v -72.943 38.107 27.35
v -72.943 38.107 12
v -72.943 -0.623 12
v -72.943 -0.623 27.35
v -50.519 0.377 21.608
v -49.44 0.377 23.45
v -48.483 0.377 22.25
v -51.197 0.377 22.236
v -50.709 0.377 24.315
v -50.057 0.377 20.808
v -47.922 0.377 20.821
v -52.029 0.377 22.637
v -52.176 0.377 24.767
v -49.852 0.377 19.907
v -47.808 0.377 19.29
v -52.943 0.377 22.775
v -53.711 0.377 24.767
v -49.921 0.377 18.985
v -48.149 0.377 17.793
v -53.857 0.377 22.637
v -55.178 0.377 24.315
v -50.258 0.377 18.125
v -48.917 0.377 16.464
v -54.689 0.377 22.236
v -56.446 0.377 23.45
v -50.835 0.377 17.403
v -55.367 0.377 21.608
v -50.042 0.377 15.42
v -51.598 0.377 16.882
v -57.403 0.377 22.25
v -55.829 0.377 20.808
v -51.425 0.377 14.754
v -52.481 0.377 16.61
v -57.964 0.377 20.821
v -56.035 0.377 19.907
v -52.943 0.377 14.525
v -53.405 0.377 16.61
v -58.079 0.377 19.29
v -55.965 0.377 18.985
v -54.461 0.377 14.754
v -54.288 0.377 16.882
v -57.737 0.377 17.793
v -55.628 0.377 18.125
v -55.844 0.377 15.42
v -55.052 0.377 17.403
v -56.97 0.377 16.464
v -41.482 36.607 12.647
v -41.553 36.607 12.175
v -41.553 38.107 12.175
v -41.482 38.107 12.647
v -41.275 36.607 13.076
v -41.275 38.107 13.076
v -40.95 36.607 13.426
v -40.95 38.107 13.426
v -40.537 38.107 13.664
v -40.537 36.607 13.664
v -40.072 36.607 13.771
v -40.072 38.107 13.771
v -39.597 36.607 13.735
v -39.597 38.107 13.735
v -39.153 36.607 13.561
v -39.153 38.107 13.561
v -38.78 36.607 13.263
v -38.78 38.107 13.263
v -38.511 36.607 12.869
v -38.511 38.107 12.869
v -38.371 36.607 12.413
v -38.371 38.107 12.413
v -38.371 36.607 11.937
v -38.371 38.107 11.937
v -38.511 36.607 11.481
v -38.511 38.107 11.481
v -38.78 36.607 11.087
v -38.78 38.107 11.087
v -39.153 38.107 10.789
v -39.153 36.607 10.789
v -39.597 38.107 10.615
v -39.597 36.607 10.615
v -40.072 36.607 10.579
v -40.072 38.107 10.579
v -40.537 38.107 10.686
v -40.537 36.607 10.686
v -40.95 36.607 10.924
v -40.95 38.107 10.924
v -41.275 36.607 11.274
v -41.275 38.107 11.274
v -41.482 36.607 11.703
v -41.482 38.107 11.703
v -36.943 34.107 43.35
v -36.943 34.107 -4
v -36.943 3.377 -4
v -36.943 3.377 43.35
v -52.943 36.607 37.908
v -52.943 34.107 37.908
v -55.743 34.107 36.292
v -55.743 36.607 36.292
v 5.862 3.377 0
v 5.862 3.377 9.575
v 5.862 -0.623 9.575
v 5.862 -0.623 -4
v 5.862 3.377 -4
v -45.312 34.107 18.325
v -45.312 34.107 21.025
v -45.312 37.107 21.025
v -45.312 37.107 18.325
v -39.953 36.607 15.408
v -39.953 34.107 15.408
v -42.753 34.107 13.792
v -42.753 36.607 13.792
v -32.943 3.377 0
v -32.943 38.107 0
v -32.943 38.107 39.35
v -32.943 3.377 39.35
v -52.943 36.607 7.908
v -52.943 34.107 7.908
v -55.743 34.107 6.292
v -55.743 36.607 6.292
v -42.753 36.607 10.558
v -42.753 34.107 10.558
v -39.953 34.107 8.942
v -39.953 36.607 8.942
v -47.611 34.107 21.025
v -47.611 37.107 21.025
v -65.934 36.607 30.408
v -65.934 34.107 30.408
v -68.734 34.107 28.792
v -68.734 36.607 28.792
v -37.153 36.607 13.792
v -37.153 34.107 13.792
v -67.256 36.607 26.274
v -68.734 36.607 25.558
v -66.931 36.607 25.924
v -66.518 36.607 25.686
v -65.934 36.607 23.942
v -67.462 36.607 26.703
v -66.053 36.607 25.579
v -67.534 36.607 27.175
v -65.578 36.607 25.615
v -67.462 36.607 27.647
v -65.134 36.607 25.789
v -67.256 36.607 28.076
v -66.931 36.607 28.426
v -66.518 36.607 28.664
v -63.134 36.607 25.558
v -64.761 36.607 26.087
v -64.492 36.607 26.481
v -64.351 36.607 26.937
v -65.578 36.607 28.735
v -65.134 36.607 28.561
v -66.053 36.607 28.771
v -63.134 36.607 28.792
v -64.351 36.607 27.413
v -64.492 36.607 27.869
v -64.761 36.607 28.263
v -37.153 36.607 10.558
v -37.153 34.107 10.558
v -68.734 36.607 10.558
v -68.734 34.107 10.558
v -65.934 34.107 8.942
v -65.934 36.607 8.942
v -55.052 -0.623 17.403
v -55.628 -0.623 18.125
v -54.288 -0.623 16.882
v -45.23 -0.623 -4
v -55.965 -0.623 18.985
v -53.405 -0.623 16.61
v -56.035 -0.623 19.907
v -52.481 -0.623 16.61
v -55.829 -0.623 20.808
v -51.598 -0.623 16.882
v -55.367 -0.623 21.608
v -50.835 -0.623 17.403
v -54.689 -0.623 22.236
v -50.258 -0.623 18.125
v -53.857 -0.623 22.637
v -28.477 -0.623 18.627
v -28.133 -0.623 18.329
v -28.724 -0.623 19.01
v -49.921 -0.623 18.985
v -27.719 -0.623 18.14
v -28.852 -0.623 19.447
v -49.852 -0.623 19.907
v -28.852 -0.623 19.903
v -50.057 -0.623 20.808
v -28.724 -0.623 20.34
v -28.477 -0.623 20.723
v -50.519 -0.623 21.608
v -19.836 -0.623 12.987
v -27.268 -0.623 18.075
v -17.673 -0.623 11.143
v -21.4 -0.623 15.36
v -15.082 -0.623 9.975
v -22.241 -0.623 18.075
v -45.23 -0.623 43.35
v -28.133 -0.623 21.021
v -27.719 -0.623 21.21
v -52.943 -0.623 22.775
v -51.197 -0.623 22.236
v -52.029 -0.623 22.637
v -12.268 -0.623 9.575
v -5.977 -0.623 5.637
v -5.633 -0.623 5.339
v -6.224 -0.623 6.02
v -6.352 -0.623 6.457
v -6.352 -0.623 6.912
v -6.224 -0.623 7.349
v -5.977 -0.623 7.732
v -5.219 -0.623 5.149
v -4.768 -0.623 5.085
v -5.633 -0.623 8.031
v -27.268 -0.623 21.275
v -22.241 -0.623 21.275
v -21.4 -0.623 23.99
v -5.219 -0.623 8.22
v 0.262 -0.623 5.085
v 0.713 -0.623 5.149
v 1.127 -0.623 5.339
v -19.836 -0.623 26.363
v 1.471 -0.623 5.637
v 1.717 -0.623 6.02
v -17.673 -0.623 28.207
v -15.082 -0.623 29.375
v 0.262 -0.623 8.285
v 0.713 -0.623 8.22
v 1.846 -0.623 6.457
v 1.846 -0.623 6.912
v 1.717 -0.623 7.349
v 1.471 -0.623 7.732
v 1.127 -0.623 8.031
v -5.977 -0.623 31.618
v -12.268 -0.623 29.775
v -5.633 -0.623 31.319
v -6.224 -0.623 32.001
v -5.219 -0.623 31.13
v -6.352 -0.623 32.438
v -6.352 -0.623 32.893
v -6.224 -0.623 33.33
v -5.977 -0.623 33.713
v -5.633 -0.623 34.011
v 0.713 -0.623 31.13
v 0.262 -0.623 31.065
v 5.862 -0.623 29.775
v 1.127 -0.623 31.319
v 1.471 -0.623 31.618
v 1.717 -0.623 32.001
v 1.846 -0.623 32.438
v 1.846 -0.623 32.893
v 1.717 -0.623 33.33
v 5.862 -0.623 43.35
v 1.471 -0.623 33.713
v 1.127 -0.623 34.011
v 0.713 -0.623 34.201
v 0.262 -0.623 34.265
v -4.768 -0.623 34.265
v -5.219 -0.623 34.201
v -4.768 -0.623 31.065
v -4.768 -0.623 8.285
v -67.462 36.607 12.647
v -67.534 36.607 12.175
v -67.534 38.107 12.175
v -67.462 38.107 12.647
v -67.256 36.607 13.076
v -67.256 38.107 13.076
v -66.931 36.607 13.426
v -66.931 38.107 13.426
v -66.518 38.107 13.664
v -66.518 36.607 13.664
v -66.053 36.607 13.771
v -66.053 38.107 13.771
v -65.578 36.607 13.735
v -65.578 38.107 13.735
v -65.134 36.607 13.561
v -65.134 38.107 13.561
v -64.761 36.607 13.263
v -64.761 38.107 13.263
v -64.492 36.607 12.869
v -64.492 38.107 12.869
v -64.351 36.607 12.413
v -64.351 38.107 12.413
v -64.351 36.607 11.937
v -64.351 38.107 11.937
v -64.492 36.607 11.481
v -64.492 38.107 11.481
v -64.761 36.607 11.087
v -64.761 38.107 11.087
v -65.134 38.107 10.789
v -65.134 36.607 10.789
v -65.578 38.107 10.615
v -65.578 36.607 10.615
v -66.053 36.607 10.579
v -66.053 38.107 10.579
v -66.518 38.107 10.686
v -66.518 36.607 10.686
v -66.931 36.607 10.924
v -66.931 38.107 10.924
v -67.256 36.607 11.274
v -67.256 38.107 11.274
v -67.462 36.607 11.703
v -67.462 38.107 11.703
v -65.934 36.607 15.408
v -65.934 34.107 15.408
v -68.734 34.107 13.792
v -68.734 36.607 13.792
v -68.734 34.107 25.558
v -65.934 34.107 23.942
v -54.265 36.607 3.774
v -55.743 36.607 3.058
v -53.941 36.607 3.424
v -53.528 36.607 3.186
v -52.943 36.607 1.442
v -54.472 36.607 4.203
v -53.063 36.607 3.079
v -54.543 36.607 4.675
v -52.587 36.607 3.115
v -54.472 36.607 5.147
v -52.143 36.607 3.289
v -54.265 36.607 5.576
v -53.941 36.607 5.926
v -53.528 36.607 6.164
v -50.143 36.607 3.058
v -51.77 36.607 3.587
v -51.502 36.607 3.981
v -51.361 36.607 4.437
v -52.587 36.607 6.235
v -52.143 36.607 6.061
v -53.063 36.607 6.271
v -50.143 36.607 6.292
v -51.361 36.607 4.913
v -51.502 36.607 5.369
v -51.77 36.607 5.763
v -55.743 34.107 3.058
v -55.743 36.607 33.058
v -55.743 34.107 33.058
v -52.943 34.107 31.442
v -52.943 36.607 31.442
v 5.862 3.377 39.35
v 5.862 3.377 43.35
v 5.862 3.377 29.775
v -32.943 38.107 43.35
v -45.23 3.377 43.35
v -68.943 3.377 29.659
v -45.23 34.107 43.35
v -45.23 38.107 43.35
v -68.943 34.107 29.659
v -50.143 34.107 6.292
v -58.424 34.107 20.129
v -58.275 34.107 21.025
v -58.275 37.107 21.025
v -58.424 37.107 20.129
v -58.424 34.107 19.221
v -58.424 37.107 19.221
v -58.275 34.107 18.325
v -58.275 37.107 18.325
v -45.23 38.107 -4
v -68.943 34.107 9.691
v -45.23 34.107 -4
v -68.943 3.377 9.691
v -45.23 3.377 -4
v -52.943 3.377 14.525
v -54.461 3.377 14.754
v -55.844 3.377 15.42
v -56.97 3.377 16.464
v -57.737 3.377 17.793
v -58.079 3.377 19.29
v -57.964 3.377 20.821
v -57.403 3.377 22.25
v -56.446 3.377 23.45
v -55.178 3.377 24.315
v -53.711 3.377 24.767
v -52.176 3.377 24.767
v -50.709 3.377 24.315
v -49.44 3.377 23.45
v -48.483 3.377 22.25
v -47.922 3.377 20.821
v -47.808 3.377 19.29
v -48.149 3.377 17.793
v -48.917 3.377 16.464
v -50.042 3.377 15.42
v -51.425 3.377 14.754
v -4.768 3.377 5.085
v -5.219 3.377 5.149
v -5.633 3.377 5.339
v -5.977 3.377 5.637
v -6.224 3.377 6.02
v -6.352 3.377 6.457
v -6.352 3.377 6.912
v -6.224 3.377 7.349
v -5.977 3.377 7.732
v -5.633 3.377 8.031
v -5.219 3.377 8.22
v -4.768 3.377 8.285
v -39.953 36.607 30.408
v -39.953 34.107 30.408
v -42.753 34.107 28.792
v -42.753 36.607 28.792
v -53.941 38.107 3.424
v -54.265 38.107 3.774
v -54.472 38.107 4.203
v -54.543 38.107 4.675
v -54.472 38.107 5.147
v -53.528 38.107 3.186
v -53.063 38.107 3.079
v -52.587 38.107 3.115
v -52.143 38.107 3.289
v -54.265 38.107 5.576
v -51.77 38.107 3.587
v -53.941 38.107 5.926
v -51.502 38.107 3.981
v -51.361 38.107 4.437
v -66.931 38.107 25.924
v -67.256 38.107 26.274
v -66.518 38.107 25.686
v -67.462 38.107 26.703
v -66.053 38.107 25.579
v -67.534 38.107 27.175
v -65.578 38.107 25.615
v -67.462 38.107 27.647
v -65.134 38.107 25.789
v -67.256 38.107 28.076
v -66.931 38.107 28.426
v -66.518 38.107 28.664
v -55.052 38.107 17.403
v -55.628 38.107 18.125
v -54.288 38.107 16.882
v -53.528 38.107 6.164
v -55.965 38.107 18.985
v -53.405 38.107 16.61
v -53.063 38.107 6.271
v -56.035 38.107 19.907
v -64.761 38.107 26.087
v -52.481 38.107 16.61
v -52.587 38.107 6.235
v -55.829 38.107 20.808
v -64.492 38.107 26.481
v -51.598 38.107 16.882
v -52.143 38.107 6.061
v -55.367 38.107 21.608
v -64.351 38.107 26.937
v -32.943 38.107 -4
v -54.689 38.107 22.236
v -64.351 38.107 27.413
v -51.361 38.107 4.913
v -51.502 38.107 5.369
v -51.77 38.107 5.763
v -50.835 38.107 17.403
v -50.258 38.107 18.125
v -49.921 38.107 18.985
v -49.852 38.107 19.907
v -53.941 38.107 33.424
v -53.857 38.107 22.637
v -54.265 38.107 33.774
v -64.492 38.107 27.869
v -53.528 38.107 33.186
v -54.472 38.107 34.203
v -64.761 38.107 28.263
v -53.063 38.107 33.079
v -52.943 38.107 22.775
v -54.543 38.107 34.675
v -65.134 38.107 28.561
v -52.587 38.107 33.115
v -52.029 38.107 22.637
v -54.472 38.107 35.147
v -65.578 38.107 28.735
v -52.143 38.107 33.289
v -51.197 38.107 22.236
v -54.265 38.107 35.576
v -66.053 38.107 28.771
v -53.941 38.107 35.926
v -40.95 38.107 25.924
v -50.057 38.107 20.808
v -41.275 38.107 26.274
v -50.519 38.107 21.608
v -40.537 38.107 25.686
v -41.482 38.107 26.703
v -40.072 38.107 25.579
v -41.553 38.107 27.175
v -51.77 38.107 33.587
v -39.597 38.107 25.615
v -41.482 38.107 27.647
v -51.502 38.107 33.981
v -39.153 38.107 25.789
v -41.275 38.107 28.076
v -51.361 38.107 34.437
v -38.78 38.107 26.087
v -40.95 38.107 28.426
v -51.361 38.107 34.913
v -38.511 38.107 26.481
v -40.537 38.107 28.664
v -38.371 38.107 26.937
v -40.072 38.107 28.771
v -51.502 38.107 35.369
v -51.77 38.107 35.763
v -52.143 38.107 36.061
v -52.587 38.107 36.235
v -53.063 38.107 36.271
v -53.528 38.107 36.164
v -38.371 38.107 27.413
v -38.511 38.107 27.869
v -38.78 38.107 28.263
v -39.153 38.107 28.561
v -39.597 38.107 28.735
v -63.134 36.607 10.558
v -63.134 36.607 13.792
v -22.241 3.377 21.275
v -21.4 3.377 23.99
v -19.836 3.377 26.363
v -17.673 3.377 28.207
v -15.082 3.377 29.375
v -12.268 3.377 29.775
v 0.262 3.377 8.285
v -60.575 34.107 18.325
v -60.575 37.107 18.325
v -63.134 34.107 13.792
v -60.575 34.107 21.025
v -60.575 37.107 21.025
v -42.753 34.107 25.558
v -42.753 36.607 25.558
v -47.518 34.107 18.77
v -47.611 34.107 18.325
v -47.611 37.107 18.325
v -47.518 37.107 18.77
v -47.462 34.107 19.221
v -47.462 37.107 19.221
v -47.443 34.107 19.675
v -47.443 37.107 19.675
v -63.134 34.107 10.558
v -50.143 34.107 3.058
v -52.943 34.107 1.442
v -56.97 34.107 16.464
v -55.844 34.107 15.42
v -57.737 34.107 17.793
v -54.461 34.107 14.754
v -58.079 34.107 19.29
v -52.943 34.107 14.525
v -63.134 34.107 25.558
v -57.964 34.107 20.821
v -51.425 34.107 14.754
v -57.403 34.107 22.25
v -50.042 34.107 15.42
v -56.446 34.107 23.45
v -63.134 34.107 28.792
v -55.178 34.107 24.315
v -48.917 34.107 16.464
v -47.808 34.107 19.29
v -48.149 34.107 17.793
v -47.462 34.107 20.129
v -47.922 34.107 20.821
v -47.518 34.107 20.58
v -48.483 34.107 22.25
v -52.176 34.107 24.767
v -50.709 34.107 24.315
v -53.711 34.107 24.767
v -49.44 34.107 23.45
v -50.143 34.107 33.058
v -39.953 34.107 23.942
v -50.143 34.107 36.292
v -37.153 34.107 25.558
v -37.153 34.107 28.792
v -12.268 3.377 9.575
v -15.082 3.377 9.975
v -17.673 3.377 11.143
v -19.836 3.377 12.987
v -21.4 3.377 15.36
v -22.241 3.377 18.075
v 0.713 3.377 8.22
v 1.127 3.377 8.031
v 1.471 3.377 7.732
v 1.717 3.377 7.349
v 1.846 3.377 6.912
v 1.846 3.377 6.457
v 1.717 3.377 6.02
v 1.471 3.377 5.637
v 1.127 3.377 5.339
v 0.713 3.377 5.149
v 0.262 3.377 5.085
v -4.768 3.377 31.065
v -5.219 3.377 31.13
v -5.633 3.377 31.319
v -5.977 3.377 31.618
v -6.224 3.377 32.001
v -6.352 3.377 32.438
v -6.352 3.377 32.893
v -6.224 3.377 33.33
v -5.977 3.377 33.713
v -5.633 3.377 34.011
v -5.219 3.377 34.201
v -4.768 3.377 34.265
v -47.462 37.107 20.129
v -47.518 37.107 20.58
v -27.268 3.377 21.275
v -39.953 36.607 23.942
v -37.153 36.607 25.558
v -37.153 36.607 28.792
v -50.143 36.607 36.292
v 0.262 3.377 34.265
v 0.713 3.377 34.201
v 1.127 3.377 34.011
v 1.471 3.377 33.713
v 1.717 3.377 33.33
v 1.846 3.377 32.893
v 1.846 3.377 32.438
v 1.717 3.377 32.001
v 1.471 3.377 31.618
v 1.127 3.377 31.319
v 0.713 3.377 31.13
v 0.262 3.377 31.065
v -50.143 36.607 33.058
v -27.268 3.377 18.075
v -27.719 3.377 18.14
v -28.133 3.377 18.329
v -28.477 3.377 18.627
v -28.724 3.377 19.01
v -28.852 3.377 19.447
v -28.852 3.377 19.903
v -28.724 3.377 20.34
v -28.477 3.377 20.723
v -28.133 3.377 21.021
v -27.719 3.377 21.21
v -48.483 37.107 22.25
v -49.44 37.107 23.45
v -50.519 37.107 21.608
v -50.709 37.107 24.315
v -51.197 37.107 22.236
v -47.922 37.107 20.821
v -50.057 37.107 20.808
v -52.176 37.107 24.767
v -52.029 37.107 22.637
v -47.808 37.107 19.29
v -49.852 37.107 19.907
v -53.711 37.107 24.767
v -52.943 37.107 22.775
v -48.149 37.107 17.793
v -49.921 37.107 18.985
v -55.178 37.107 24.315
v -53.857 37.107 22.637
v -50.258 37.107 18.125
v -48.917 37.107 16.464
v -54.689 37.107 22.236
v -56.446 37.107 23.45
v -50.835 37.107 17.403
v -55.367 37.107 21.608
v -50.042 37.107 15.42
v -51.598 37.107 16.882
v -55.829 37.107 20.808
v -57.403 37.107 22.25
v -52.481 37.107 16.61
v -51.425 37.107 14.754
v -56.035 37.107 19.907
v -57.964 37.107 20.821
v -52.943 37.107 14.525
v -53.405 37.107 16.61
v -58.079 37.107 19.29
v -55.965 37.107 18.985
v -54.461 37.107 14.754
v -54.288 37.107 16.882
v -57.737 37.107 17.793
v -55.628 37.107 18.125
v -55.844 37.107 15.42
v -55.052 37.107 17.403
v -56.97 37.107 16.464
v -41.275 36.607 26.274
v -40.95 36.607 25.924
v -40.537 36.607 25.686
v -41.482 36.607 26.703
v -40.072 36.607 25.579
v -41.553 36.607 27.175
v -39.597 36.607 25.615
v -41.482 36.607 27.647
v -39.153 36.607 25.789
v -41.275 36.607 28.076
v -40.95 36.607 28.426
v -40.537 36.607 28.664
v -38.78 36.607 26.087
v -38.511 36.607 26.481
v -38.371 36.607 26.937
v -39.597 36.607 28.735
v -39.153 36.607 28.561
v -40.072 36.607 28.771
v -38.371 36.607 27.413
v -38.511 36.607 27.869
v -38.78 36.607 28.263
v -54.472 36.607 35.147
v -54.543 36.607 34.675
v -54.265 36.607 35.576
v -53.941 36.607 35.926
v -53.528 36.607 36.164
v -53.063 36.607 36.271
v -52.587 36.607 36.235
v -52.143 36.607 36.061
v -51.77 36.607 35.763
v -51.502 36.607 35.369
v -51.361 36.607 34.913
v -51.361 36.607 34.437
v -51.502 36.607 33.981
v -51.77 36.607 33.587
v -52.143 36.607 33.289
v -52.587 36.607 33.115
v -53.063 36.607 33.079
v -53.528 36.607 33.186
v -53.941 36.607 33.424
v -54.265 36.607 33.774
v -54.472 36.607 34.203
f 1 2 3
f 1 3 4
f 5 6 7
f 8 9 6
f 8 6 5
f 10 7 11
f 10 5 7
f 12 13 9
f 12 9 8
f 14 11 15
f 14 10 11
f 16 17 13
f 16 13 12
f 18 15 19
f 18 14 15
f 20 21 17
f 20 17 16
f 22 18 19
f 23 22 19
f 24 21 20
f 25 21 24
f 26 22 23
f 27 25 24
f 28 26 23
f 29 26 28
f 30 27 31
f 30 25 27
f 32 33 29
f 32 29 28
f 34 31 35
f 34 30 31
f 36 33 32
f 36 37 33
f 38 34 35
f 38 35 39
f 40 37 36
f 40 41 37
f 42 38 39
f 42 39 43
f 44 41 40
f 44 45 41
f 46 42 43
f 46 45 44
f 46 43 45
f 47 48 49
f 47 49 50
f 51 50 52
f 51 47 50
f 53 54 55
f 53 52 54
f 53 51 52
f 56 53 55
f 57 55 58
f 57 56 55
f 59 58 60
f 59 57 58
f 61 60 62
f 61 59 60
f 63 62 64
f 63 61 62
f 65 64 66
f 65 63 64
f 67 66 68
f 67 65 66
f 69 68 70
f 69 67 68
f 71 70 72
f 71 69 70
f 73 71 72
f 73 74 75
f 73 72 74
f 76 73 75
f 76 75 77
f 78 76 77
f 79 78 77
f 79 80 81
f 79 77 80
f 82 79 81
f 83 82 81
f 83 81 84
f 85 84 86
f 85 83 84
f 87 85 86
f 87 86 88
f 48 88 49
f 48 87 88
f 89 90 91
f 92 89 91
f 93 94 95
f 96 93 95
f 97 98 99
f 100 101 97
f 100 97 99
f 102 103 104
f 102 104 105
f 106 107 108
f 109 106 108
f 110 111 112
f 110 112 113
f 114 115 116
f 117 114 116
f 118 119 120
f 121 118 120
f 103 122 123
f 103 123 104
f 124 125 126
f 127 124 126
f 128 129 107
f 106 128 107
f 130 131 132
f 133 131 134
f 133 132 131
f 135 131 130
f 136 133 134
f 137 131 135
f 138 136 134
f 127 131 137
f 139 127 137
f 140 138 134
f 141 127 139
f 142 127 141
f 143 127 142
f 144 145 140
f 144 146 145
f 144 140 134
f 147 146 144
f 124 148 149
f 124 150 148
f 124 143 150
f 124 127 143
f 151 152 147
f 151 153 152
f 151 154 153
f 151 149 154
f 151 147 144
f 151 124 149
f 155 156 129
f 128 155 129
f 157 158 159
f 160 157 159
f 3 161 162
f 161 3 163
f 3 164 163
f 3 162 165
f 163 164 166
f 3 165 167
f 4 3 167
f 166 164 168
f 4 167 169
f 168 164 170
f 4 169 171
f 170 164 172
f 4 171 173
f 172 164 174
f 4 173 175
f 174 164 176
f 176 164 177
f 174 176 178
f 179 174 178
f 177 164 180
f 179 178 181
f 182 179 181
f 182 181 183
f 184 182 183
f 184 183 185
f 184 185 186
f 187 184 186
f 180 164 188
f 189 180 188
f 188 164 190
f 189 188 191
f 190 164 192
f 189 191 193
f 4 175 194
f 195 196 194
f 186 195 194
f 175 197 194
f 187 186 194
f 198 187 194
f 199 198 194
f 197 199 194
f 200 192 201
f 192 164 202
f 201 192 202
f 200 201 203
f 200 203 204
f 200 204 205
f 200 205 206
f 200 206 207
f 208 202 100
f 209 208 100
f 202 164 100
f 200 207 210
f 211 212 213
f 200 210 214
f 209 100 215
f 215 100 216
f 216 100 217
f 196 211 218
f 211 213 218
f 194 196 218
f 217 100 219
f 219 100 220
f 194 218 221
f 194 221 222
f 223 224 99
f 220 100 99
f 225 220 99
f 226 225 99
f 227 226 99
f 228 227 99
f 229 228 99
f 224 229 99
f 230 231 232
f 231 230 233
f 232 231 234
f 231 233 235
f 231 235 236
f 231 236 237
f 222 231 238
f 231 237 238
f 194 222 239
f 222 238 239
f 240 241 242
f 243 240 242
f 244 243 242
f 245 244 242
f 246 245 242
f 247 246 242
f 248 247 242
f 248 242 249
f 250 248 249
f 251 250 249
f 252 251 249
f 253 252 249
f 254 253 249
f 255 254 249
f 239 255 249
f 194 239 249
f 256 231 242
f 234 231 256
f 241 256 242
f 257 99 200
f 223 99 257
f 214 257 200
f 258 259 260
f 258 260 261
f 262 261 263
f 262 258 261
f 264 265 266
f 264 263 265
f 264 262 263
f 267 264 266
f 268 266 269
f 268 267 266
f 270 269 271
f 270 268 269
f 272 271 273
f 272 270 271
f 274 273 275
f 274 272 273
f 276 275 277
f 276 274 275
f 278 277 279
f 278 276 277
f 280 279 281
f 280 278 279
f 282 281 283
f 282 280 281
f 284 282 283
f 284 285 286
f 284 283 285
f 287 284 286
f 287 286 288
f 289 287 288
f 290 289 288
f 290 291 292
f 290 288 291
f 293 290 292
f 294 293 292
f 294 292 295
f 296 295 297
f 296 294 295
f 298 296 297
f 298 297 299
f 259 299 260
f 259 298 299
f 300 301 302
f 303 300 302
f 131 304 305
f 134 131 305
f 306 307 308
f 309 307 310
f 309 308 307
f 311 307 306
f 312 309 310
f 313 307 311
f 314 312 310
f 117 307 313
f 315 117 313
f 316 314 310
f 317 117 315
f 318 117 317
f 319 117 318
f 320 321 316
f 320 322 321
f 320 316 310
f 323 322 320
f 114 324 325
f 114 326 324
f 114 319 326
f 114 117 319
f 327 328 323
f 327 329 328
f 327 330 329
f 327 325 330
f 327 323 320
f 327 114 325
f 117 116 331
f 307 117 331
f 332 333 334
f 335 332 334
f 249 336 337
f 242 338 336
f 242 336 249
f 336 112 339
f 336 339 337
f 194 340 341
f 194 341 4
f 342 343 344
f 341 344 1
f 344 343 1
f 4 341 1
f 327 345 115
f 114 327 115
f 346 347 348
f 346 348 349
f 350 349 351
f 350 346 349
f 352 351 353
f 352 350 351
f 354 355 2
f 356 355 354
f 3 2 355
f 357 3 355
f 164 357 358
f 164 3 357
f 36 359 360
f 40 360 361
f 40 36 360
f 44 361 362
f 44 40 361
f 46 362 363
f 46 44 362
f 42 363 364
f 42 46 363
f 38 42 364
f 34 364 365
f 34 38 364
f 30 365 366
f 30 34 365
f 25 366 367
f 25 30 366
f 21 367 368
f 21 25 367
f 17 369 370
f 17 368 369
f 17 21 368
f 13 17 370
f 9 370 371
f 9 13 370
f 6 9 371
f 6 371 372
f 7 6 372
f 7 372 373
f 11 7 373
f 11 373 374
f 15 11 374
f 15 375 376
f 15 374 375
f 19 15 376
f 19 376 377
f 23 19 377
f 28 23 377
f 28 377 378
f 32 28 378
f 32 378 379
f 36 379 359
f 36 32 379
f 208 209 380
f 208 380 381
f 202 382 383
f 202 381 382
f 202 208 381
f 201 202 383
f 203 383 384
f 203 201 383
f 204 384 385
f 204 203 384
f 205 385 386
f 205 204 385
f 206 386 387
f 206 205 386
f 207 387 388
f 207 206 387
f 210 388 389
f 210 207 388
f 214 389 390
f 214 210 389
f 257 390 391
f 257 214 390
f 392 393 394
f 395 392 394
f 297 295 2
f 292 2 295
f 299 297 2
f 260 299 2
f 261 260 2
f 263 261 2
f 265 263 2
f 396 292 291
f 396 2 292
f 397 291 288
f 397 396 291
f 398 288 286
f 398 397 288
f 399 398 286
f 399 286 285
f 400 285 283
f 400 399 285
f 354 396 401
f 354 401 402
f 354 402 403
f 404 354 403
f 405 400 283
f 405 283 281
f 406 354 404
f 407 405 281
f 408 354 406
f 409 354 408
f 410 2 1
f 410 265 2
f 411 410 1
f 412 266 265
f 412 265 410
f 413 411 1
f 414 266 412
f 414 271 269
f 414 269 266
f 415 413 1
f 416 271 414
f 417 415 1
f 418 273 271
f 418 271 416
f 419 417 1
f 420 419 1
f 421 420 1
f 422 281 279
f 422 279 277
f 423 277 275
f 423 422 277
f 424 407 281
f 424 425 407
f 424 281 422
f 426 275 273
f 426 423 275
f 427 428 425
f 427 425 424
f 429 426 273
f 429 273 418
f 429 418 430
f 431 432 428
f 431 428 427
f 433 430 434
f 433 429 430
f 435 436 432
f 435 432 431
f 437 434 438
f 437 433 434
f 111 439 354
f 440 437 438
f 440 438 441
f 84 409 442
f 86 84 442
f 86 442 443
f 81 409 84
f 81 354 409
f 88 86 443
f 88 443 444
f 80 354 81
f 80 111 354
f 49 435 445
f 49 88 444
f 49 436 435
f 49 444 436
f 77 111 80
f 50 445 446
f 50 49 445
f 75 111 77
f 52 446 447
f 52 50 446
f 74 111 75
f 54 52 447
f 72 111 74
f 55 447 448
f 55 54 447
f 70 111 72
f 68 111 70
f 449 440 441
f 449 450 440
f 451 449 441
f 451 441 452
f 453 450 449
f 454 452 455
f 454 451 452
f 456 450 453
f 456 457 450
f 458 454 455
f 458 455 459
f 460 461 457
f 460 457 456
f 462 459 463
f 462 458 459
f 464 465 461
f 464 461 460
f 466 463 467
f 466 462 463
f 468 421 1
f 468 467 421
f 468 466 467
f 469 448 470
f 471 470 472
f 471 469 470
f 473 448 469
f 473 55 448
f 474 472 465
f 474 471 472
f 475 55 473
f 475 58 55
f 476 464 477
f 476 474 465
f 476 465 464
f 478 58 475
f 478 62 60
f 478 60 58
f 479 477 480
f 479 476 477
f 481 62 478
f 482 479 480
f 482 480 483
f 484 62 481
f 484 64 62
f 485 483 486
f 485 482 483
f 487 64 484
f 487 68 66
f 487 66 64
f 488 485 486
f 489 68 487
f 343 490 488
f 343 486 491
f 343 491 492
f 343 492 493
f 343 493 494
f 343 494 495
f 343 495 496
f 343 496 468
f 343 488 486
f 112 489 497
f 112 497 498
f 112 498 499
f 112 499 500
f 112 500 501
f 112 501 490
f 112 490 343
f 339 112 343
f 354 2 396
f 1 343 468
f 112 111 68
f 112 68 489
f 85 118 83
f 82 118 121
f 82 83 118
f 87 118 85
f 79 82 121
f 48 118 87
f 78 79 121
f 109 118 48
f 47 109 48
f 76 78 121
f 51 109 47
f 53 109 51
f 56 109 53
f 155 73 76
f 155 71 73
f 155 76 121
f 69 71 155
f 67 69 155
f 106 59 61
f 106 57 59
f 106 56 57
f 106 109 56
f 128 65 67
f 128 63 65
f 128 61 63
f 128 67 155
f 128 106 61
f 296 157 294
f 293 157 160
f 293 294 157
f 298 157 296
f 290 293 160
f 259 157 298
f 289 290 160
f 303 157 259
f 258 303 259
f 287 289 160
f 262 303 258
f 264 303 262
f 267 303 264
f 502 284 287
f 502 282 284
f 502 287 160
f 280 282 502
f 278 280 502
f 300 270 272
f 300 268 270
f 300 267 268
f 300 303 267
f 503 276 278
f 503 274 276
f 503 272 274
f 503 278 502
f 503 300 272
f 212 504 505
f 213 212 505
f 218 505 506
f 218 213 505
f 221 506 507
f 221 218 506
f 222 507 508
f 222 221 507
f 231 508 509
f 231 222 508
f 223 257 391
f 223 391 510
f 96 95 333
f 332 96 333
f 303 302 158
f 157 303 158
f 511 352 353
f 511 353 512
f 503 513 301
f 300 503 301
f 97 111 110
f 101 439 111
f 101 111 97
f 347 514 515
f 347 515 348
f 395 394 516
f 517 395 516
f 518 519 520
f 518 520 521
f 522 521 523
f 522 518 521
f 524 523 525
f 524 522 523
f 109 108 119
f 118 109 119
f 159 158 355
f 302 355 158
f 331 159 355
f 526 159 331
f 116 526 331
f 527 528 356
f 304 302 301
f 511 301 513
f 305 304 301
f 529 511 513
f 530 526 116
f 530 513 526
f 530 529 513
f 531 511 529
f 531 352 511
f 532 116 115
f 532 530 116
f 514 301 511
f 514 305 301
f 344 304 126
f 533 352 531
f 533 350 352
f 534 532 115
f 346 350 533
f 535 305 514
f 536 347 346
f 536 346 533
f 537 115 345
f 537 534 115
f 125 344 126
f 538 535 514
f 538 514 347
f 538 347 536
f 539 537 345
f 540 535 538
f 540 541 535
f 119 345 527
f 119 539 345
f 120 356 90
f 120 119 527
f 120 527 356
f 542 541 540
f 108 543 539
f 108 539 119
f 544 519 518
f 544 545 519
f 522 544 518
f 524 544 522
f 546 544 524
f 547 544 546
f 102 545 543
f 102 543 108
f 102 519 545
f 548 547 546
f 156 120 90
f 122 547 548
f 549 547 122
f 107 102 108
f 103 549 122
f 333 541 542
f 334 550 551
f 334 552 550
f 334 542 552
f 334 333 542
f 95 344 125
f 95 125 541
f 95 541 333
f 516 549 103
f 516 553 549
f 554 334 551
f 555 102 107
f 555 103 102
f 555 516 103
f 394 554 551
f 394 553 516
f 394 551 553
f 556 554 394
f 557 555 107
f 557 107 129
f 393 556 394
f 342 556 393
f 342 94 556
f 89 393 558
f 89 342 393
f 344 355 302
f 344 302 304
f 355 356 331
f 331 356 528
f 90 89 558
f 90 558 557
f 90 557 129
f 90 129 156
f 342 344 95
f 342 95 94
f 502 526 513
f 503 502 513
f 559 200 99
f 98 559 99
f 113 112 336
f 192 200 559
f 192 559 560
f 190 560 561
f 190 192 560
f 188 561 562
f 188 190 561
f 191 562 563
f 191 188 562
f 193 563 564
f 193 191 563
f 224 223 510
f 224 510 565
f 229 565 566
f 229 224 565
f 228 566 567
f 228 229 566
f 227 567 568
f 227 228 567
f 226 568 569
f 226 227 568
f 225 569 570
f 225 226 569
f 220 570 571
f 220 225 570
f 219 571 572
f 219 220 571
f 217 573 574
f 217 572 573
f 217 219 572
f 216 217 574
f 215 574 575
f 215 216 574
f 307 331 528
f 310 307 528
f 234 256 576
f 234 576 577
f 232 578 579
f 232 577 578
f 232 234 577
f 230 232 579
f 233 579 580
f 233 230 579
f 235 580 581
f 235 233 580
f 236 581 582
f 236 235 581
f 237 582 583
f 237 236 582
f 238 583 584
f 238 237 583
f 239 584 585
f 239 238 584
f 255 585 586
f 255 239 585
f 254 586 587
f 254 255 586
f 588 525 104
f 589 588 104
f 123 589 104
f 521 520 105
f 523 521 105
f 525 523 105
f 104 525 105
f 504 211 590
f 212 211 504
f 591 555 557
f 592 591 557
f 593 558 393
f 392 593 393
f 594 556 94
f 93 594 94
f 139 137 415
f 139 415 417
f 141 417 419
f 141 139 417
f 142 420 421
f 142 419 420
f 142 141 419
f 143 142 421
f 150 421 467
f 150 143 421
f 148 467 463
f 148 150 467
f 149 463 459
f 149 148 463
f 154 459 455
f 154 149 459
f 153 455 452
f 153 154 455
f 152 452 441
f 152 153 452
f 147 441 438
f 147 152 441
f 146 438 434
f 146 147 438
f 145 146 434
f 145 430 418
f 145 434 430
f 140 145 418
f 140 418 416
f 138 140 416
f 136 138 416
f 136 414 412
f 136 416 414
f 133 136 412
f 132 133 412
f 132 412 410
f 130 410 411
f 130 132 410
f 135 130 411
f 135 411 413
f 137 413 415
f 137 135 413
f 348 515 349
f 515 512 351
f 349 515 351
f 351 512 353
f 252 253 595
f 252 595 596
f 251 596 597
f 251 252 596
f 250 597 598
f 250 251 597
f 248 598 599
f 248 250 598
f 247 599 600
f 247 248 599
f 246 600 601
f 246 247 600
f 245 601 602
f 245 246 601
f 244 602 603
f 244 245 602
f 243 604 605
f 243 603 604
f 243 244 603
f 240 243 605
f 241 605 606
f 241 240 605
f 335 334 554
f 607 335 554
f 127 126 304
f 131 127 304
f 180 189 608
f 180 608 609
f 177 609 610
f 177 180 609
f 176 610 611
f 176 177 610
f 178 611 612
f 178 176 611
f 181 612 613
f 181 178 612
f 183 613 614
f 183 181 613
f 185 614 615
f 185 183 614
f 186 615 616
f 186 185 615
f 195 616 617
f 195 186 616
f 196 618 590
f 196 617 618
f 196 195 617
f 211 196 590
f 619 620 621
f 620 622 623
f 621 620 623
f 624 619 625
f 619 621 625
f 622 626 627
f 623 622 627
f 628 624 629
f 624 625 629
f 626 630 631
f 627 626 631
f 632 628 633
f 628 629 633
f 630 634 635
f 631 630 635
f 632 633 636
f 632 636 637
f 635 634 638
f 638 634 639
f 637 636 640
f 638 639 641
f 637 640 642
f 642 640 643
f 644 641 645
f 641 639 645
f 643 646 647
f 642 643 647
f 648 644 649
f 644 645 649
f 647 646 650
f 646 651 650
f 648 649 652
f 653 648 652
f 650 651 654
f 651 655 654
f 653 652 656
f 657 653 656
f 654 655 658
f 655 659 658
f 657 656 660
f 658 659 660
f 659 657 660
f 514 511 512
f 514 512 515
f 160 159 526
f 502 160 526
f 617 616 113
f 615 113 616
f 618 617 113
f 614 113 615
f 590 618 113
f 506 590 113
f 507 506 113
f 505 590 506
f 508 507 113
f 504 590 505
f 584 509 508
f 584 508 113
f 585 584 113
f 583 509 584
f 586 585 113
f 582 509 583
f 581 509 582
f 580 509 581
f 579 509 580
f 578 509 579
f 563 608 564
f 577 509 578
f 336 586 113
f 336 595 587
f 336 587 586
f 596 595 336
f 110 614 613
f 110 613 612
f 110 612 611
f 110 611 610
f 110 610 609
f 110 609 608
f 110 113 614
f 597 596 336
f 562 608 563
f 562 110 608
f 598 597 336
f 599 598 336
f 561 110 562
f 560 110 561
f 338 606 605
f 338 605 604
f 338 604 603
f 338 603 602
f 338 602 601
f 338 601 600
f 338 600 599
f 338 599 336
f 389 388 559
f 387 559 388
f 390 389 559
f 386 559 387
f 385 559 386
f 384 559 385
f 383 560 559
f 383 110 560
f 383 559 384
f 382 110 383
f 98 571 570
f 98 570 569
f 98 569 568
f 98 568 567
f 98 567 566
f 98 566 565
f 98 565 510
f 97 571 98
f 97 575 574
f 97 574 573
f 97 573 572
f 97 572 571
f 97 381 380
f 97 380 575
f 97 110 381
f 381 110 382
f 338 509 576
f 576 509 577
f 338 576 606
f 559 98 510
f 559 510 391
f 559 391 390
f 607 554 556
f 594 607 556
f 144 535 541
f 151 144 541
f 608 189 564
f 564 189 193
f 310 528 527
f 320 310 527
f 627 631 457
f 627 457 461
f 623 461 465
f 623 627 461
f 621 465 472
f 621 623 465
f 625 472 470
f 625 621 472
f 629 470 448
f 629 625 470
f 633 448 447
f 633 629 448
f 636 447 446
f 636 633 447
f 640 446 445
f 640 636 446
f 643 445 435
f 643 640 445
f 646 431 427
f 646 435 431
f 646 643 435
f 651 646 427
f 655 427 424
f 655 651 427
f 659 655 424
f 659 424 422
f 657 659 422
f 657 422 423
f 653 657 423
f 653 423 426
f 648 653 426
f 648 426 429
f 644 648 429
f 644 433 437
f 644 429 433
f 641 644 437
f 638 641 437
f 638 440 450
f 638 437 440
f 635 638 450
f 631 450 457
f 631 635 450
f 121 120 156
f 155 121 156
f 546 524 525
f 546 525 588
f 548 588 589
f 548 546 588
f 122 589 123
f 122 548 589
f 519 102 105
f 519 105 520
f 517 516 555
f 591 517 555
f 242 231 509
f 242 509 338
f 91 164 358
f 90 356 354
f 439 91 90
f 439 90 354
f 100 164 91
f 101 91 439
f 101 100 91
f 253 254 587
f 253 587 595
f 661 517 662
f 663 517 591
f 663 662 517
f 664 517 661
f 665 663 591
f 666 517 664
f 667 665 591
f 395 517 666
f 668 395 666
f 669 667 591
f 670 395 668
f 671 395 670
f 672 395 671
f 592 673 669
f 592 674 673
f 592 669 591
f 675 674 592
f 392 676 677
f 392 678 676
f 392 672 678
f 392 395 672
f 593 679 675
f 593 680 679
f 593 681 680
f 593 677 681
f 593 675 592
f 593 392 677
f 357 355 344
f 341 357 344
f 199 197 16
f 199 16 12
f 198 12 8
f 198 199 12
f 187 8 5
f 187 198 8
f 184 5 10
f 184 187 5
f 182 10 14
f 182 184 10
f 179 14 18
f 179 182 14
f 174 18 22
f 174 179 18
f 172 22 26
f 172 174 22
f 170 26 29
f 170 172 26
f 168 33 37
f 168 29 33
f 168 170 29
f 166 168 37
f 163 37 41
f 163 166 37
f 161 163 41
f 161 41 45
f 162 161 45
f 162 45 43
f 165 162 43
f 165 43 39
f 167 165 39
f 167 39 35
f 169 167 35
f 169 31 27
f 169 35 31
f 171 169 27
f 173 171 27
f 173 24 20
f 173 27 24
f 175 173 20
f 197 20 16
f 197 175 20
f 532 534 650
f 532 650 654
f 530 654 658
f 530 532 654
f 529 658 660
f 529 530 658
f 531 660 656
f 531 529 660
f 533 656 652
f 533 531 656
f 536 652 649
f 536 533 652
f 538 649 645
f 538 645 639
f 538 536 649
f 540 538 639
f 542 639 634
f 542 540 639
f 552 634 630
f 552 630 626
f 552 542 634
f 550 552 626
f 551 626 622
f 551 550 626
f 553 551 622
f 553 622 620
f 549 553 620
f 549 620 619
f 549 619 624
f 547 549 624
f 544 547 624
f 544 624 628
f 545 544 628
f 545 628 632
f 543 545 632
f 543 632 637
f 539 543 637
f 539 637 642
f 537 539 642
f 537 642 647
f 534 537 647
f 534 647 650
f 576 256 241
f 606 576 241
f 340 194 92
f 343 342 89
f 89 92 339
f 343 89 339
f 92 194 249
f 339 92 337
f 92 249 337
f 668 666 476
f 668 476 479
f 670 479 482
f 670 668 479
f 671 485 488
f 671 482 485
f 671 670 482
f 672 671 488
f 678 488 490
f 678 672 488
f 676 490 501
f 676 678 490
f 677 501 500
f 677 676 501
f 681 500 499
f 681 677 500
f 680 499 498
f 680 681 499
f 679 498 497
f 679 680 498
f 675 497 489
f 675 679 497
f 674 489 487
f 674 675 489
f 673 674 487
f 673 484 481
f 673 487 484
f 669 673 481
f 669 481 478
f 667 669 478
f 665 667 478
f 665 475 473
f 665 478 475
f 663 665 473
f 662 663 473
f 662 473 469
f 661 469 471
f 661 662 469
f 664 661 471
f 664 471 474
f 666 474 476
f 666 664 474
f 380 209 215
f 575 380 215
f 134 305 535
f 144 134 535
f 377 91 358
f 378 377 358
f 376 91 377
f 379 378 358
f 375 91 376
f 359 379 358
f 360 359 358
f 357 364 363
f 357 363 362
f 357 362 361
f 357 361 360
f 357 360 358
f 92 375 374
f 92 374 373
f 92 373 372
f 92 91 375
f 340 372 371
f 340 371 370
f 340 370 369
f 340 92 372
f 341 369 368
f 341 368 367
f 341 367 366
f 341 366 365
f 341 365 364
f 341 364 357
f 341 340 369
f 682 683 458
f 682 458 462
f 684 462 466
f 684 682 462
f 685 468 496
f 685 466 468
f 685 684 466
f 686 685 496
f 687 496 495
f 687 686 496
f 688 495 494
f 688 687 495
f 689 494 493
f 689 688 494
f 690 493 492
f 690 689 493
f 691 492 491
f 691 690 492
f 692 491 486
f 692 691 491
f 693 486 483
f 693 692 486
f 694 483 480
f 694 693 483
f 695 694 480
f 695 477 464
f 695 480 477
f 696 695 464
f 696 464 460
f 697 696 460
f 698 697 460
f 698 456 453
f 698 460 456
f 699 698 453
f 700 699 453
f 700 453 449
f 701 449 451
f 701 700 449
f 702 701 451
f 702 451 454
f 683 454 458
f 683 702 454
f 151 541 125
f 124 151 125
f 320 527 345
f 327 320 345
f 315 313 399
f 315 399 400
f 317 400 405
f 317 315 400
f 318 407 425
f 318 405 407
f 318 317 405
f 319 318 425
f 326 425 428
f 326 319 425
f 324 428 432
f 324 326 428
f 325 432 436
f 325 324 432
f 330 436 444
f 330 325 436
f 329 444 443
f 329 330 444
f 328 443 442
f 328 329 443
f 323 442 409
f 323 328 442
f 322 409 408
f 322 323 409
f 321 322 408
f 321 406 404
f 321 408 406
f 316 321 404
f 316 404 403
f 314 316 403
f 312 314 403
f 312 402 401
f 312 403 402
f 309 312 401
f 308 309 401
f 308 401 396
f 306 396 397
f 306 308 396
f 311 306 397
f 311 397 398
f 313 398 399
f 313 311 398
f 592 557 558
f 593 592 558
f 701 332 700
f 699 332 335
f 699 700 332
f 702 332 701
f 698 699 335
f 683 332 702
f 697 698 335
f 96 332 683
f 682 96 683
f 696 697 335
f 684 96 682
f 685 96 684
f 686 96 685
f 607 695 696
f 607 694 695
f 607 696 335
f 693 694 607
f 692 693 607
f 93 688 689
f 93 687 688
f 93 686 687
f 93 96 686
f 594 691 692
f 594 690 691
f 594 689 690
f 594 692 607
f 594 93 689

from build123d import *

# Parameters (mm, degrees)
BOSS_EXTRUDE1_DEPTH     = 39.35
CUT_EXTRUDE2_DEPTH      = 33.73
CUT_EXTRUDE2_DEPTH_BACK = 3
SKETCH3_R               = 5.15
CUT_EXTRUDE3_DEPTH      = 33.73
CUT_EXTRUDE4_DEPTH      = 87.647311883
CUT_EXTRUDE4_DEPTH_BACK = 87.647311883
SKETCH3_5_R             = 3.1
SKETCH3_5_R_2           = 10.1
SKETCH3_5_R_3           = 1.6
SKETCH3_5_W             = 20.675
SKETCH3_5_H             = 20.2
SKETCH3_5_W_2           = 5.027537917
SKETCH3_5_H_2           = 3.2
SKETCH3_5_W_3           = 5.03
SKETCH3_6_R             = 1.6
CUT_EXTRUDE5_DEPTH      = 87.647311883
BOSS_EXTRUDE2_DEPTH     = 4
BOSS_EXTRUDE3_DEPTH     = 4
CUT_EXTRUDE6_DEPTH      = 92.909209967
CUT_EXTRUDE6_DEPTH_BACK = 92.909209967
CUT_EXTRUDE7_DEPTH      = 2.5
SKETCH10_W              = 47.35
SKETCH10_H              = 38.73
BOSS_EXTRUDE5_DEPTH     = 4
CHAMFER3_SIZE           = 16
CHAMFER3_SIZE_2         = 27.712812921


with BuildPart() as part:
    # Sketch1 → Boss-Extrude1 (new body)
    with BuildSketch(Plane.XY):
        Polygon((-68.943174111, 38.106680783), (-32.943174111, 38.106680783), (-32.943174111, 3.376680783), (8.406825889, 3.376680783), (8.406825889, -0.623319217), (-68.943174111, -0.623319217), (-68.943174111, 3.376680783), (-36.943174111, 3.376680783), (-36.943174111, 34.106680783), (-68.943174111, 34.106680783), align=None)
    extrude(amount=BOSS_EXTRUDE1_DEPTH)

    # Sketch3 → Cut-Extrude2 (cut, two sides: drawn at the far end of the back side and taken through both)
    with BuildSketch(Plane(origin=(0, 3.376680783, 0), x_dir=(1, 0, 0), z_dir=(0, 1, 0)).offset(-CUT_EXTRUDE2_DEPTH_BACK)):
        with Locations(Location((-52.943174111, -19.675, 0), (0, 0, 90))):
            Circle(SKETCH3_R)
    extrude(amount=CUT_EXTRUDE2_DEPTH + CUT_EXTRUDE2_DEPTH_BACK, mode=Mode.SUBTRACT)

    # Sketch3<4> → Cut-Extrude3 (cut)
    with BuildSketch(Plane(origin=(0, 3.376680783, 0), x_dir=(1, 0, 0), z_dir=(0, 1, 0))):
        with BuildLine():
            Line((-47.611429556, -21.025), (-45.3116605, -21.025))
            Line((-45.3116605, -21.025), (-45.3116605, -18.325))
            Line((-45.3116605, -18.325), (-47.611429556, -18.325))
            ThreePointArc((-47.611429556, -18.325), (-47.485400066, -18.994777629), (-47.443174111, -19.675))
            ThreePointArc((-47.443174111, -19.675), (-47.485400066, -20.355222371), (-47.611429556, -21.025))
        make_face()
        with BuildLine():
            Line((-60.574687722, -18.325), (-60.574687722, -21.025))
            Line((-60.574687722, -21.025), (-58.274918666, -21.025))
            ThreePointArc((-58.274918666, -21.025), (-58.443174111, -19.675), (-58.274918666, -18.325))
            Line((-58.274918666, -18.325), (-60.574687722, -18.325))
        make_face()
    extrude(amount=CUT_EXTRUDE3_DEPTH, mode=Mode.SUBTRACT)

    # Sketch3<5> → Cut-Extrude4 (cut, two sides: drawn at the far end of the back side and taken through both)
    with BuildSketch(Plane(origin=(0, 3.376680783, 0), x_dir=(1, 0, 0), z_dir=(0, 1, 0)).offset(-CUT_EXTRUDE4_DEPTH_BACK)):
        with Locations(Location((-52.943174111, -19.675, 0), (0, 0, 270))):
            Circle(SKETCH3_5_R)
        with Locations((-12.268174111, -19.675)):
            Circle(SKETCH3_5_R_2)
        with Locations((-4.768174111, -32.665381057)):
            Circle(SKETCH3_5_R_3)
        with Locations((-4.768174111, -6.684618943)):
            Circle(SKETCH3_5_R_3)
        with Locations((-27.268174111, -19.675)):
            Circle(SKETCH3_5_R_3)
        with Locations((0.261825889, -32.665381057)):
            Circle(SKETCH3_5_R_3)
        with Locations((0.261825889, -6.684618943)):
            Circle(SKETCH3_5_R_3)
        with Locations((-1.930674111, -19.675)):
            Rectangle(SKETCH3_5_W, SKETCH3_5_H)
        with Locations((-24.754405152, -19.675)):
            Rectangle(SKETCH3_5_W_2, SKETCH3_5_H_2)
        with Locations((-2.253174111, -32.665381057)):
            Rectangle(SKETCH3_5_W_3, SKETCH3_5_H_2)
        with Locations((-2.253174111, -6.684618943)):
            Rectangle(SKETCH3_5_W_3, SKETCH3_5_H_2)
    extrude(amount=CUT_EXTRUDE4_DEPTH + CUT_EXTRUDE4_DEPTH_BACK, mode=Mode.SUBTRACT)

    # Sketch3<6> → Cut-Extrude5 (cut, through all)
    with BuildSketch(Plane(origin=(0, 3.376680783, 0), x_dir=(1, 0, 0), z_dir=(0, 1, 0))):
        with Locations(Location((-52.943174111, -34.675, 0), (0, 0, 180))):
            Circle(SKETCH3_6_R)
        with Locations(Location((-65.933555168, -27.175, 0), (0, 0, 180))):
            Circle(SKETCH3_6_R)
        with Locations(Location((-65.933555168, -12.175, 0), (0, 0, 180))):
            Circle(SKETCH3_6_R)
        with Locations(Location((-52.943174111, -4.675, 0), (0, 0, 180))):
            Circle(SKETCH3_6_R)
        with Locations(Location((-39.952793054, -12.175, 0), (0, 0, 180))):
            Circle(SKETCH3_6_R)
        with Locations(Location((-39.952793054, -27.175, 0), (0, 0, 180))):
            Circle(SKETCH3_6_R)
    extrude(amount=CUT_EXTRUDE5_DEPTH, mode=Mode.SUBTRACT)

    # Sketch4 → Boss-Extrude2 (add)
    with BuildSketch(Plane.XY.offset(39.35)):
        Polygon((-68.943174111, 38.106680783), (-68.943174111, 34.106680783), (-36.943174111, 34.106680783), (-36.943174111, 3.376680783), (-68.943174111, 3.376680783), (-68.943174111, -0.623319217), (8.406825889, -0.623319217), (8.406825889, 38.106680783), align=None)
    extrude(amount=BOSS_EXTRUDE2_DEPTH)

    # Sketch5 → Boss-Extrude3 (add)
    with BuildSketch(Plane(origin=(0, 0, 0), x_dir=(-1, 0, 0), z_dir=(0, 0, -1))):
        Polygon((68.943174111, 38.106680783), (68.943174111, 34.106680783), (36.943174111, 34.106680783), (36.943174111, 3.376680783), (68.943174111, 3.376680783), (68.943174111, -0.623319217), (-8.406825889, -0.623319217), (-8.406825889, 38.106680783), align=None)
    extrude(amount=BOSS_EXTRUDE3_DEPTH)

    # Sketch6 → Cut-Extrude6 (cut, two sides: drawn at the far end of the back side and taken through both)
    with BuildSketch(Plane.XY.offset(43.35).offset(-CUT_EXTRUDE6_DEPTH_BACK)):
        Polygon((-32.943174111, 38.106680783), (5.861825889, 3.376680783), (5.861825889, -0.623319217), (8.406825889, -0.623319217), (8.406825889, 38.106680783), align=None)
    extrude(amount=CUT_EXTRUDE6_DEPTH + CUT_EXTRUDE6_DEPTH_BACK, mode=Mode.SUBTRACT)

    # Sketch8 → Cut-Extrude7 (cut)
    with BuildSketch(Plane.XZ.offset(-34.106680783)):
        Polygon((-65.933555168, 15.408161507), (-68.733555168, 13.791580754), (-68.733555168, 10.558419246), (-65.933555168, 8.941838493), (-63.133555168, 10.558419246), (-63.133555168, 13.791580754), align=None)
        Polygon((-65.933555168, 30.408161507), (-68.733555168, 28.791580754), (-68.733555168, 25.558419246), (-65.933555168, 23.941838493), (-63.133555168, 25.558419246), (-63.133555168, 28.791580754), align=None)
        Polygon((-52.943174111, 1.441838493), (-50.143174111, 3.058419246), (-50.143174111, 6.291580754), (-52.943174111, 7.908161507), (-55.743174111, 6.291580754), (-55.743174111, 3.058419246), align=None)
        Polygon((-39.952793054, 8.941838493), (-37.152793054, 10.558419246), (-37.152793054, 13.791580754), (-39.952793054, 15.408161507), (-42.752793054, 13.791580754), (-42.752793054, 10.558419246), align=None)
        Polygon((-39.952793054, 23.941838493), (-37.152793054, 25.558419246), (-37.152793054, 28.791580754), (-39.952793054, 30.408161507), (-42.752793054, 28.791580754), (-42.752793054, 25.558419246), align=None)
        Polygon((-52.943174111, 37.908161507), (-55.743174111, 36.291580754), (-55.743174111, 33.058419246), (-52.943174111, 31.441838493), (-50.143174111, 33.058419246), (-50.143174111, 36.291580754), align=None)
    extrude(amount=-CUT_EXTRUDE7_DEPTH, mode=Mode.SUBTRACT)

    # Sketch10 → Boss-Extrude5 (add)
    with BuildSketch(Plane.ZY.offset(68.943174111)):
        with Locations((19.675, 18.741680783)):
            Rectangle(SKETCH10_W, SKETCH10_H)
    extrude(amount=BOSS_EXTRUDE5_DEPTH)

    # Chamfer3
    # the kernel refuses this chamfer: 27.712812921, 16 mm, written as the material it takes off along each edge
    with BuildSketch(Plane(origin=(-72.943174111, -72.318742746, -4), x_dir=(-0.05789386240267147, 0, 0.9983227437537926), z_dir=(0, 1, 0))) as chamfer3_piece_1:
        Polygon((CHAMFER3_SIZE * 0.998322743754, CHAMFER3_SIZE * 0.0578938624027), (-CHAMFER3_SIZE_2 * 0.0578938624029, CHAMFER3_SIZE_2 * 0.998322743757), (0, 0), align=None)
    extrude(amount=182.120847059, mode=Mode.SUBTRACT)
    with BuildSketch(Plane(origin=(-72.943174111, 109.802104312, 43.35), x_dir=(0.9998132206222079, 0, 0.019326765612700702), z_dir=(0, -1, 0))) as chamfer3_piece_2:
        Polygon((CHAMFER3_SIZE_2 * 0.999813220626, -CHAMFER3_SIZE_2 * 0.0193267656128), (-CHAMFER3_SIZE * 0.0193267656127, -CHAMFER3_SIZE * 0.999813220622), (0, 0), align=None)
    extrude(amount=182.120847059, mode=Mode.SUBTRACT)


solid = part.part
